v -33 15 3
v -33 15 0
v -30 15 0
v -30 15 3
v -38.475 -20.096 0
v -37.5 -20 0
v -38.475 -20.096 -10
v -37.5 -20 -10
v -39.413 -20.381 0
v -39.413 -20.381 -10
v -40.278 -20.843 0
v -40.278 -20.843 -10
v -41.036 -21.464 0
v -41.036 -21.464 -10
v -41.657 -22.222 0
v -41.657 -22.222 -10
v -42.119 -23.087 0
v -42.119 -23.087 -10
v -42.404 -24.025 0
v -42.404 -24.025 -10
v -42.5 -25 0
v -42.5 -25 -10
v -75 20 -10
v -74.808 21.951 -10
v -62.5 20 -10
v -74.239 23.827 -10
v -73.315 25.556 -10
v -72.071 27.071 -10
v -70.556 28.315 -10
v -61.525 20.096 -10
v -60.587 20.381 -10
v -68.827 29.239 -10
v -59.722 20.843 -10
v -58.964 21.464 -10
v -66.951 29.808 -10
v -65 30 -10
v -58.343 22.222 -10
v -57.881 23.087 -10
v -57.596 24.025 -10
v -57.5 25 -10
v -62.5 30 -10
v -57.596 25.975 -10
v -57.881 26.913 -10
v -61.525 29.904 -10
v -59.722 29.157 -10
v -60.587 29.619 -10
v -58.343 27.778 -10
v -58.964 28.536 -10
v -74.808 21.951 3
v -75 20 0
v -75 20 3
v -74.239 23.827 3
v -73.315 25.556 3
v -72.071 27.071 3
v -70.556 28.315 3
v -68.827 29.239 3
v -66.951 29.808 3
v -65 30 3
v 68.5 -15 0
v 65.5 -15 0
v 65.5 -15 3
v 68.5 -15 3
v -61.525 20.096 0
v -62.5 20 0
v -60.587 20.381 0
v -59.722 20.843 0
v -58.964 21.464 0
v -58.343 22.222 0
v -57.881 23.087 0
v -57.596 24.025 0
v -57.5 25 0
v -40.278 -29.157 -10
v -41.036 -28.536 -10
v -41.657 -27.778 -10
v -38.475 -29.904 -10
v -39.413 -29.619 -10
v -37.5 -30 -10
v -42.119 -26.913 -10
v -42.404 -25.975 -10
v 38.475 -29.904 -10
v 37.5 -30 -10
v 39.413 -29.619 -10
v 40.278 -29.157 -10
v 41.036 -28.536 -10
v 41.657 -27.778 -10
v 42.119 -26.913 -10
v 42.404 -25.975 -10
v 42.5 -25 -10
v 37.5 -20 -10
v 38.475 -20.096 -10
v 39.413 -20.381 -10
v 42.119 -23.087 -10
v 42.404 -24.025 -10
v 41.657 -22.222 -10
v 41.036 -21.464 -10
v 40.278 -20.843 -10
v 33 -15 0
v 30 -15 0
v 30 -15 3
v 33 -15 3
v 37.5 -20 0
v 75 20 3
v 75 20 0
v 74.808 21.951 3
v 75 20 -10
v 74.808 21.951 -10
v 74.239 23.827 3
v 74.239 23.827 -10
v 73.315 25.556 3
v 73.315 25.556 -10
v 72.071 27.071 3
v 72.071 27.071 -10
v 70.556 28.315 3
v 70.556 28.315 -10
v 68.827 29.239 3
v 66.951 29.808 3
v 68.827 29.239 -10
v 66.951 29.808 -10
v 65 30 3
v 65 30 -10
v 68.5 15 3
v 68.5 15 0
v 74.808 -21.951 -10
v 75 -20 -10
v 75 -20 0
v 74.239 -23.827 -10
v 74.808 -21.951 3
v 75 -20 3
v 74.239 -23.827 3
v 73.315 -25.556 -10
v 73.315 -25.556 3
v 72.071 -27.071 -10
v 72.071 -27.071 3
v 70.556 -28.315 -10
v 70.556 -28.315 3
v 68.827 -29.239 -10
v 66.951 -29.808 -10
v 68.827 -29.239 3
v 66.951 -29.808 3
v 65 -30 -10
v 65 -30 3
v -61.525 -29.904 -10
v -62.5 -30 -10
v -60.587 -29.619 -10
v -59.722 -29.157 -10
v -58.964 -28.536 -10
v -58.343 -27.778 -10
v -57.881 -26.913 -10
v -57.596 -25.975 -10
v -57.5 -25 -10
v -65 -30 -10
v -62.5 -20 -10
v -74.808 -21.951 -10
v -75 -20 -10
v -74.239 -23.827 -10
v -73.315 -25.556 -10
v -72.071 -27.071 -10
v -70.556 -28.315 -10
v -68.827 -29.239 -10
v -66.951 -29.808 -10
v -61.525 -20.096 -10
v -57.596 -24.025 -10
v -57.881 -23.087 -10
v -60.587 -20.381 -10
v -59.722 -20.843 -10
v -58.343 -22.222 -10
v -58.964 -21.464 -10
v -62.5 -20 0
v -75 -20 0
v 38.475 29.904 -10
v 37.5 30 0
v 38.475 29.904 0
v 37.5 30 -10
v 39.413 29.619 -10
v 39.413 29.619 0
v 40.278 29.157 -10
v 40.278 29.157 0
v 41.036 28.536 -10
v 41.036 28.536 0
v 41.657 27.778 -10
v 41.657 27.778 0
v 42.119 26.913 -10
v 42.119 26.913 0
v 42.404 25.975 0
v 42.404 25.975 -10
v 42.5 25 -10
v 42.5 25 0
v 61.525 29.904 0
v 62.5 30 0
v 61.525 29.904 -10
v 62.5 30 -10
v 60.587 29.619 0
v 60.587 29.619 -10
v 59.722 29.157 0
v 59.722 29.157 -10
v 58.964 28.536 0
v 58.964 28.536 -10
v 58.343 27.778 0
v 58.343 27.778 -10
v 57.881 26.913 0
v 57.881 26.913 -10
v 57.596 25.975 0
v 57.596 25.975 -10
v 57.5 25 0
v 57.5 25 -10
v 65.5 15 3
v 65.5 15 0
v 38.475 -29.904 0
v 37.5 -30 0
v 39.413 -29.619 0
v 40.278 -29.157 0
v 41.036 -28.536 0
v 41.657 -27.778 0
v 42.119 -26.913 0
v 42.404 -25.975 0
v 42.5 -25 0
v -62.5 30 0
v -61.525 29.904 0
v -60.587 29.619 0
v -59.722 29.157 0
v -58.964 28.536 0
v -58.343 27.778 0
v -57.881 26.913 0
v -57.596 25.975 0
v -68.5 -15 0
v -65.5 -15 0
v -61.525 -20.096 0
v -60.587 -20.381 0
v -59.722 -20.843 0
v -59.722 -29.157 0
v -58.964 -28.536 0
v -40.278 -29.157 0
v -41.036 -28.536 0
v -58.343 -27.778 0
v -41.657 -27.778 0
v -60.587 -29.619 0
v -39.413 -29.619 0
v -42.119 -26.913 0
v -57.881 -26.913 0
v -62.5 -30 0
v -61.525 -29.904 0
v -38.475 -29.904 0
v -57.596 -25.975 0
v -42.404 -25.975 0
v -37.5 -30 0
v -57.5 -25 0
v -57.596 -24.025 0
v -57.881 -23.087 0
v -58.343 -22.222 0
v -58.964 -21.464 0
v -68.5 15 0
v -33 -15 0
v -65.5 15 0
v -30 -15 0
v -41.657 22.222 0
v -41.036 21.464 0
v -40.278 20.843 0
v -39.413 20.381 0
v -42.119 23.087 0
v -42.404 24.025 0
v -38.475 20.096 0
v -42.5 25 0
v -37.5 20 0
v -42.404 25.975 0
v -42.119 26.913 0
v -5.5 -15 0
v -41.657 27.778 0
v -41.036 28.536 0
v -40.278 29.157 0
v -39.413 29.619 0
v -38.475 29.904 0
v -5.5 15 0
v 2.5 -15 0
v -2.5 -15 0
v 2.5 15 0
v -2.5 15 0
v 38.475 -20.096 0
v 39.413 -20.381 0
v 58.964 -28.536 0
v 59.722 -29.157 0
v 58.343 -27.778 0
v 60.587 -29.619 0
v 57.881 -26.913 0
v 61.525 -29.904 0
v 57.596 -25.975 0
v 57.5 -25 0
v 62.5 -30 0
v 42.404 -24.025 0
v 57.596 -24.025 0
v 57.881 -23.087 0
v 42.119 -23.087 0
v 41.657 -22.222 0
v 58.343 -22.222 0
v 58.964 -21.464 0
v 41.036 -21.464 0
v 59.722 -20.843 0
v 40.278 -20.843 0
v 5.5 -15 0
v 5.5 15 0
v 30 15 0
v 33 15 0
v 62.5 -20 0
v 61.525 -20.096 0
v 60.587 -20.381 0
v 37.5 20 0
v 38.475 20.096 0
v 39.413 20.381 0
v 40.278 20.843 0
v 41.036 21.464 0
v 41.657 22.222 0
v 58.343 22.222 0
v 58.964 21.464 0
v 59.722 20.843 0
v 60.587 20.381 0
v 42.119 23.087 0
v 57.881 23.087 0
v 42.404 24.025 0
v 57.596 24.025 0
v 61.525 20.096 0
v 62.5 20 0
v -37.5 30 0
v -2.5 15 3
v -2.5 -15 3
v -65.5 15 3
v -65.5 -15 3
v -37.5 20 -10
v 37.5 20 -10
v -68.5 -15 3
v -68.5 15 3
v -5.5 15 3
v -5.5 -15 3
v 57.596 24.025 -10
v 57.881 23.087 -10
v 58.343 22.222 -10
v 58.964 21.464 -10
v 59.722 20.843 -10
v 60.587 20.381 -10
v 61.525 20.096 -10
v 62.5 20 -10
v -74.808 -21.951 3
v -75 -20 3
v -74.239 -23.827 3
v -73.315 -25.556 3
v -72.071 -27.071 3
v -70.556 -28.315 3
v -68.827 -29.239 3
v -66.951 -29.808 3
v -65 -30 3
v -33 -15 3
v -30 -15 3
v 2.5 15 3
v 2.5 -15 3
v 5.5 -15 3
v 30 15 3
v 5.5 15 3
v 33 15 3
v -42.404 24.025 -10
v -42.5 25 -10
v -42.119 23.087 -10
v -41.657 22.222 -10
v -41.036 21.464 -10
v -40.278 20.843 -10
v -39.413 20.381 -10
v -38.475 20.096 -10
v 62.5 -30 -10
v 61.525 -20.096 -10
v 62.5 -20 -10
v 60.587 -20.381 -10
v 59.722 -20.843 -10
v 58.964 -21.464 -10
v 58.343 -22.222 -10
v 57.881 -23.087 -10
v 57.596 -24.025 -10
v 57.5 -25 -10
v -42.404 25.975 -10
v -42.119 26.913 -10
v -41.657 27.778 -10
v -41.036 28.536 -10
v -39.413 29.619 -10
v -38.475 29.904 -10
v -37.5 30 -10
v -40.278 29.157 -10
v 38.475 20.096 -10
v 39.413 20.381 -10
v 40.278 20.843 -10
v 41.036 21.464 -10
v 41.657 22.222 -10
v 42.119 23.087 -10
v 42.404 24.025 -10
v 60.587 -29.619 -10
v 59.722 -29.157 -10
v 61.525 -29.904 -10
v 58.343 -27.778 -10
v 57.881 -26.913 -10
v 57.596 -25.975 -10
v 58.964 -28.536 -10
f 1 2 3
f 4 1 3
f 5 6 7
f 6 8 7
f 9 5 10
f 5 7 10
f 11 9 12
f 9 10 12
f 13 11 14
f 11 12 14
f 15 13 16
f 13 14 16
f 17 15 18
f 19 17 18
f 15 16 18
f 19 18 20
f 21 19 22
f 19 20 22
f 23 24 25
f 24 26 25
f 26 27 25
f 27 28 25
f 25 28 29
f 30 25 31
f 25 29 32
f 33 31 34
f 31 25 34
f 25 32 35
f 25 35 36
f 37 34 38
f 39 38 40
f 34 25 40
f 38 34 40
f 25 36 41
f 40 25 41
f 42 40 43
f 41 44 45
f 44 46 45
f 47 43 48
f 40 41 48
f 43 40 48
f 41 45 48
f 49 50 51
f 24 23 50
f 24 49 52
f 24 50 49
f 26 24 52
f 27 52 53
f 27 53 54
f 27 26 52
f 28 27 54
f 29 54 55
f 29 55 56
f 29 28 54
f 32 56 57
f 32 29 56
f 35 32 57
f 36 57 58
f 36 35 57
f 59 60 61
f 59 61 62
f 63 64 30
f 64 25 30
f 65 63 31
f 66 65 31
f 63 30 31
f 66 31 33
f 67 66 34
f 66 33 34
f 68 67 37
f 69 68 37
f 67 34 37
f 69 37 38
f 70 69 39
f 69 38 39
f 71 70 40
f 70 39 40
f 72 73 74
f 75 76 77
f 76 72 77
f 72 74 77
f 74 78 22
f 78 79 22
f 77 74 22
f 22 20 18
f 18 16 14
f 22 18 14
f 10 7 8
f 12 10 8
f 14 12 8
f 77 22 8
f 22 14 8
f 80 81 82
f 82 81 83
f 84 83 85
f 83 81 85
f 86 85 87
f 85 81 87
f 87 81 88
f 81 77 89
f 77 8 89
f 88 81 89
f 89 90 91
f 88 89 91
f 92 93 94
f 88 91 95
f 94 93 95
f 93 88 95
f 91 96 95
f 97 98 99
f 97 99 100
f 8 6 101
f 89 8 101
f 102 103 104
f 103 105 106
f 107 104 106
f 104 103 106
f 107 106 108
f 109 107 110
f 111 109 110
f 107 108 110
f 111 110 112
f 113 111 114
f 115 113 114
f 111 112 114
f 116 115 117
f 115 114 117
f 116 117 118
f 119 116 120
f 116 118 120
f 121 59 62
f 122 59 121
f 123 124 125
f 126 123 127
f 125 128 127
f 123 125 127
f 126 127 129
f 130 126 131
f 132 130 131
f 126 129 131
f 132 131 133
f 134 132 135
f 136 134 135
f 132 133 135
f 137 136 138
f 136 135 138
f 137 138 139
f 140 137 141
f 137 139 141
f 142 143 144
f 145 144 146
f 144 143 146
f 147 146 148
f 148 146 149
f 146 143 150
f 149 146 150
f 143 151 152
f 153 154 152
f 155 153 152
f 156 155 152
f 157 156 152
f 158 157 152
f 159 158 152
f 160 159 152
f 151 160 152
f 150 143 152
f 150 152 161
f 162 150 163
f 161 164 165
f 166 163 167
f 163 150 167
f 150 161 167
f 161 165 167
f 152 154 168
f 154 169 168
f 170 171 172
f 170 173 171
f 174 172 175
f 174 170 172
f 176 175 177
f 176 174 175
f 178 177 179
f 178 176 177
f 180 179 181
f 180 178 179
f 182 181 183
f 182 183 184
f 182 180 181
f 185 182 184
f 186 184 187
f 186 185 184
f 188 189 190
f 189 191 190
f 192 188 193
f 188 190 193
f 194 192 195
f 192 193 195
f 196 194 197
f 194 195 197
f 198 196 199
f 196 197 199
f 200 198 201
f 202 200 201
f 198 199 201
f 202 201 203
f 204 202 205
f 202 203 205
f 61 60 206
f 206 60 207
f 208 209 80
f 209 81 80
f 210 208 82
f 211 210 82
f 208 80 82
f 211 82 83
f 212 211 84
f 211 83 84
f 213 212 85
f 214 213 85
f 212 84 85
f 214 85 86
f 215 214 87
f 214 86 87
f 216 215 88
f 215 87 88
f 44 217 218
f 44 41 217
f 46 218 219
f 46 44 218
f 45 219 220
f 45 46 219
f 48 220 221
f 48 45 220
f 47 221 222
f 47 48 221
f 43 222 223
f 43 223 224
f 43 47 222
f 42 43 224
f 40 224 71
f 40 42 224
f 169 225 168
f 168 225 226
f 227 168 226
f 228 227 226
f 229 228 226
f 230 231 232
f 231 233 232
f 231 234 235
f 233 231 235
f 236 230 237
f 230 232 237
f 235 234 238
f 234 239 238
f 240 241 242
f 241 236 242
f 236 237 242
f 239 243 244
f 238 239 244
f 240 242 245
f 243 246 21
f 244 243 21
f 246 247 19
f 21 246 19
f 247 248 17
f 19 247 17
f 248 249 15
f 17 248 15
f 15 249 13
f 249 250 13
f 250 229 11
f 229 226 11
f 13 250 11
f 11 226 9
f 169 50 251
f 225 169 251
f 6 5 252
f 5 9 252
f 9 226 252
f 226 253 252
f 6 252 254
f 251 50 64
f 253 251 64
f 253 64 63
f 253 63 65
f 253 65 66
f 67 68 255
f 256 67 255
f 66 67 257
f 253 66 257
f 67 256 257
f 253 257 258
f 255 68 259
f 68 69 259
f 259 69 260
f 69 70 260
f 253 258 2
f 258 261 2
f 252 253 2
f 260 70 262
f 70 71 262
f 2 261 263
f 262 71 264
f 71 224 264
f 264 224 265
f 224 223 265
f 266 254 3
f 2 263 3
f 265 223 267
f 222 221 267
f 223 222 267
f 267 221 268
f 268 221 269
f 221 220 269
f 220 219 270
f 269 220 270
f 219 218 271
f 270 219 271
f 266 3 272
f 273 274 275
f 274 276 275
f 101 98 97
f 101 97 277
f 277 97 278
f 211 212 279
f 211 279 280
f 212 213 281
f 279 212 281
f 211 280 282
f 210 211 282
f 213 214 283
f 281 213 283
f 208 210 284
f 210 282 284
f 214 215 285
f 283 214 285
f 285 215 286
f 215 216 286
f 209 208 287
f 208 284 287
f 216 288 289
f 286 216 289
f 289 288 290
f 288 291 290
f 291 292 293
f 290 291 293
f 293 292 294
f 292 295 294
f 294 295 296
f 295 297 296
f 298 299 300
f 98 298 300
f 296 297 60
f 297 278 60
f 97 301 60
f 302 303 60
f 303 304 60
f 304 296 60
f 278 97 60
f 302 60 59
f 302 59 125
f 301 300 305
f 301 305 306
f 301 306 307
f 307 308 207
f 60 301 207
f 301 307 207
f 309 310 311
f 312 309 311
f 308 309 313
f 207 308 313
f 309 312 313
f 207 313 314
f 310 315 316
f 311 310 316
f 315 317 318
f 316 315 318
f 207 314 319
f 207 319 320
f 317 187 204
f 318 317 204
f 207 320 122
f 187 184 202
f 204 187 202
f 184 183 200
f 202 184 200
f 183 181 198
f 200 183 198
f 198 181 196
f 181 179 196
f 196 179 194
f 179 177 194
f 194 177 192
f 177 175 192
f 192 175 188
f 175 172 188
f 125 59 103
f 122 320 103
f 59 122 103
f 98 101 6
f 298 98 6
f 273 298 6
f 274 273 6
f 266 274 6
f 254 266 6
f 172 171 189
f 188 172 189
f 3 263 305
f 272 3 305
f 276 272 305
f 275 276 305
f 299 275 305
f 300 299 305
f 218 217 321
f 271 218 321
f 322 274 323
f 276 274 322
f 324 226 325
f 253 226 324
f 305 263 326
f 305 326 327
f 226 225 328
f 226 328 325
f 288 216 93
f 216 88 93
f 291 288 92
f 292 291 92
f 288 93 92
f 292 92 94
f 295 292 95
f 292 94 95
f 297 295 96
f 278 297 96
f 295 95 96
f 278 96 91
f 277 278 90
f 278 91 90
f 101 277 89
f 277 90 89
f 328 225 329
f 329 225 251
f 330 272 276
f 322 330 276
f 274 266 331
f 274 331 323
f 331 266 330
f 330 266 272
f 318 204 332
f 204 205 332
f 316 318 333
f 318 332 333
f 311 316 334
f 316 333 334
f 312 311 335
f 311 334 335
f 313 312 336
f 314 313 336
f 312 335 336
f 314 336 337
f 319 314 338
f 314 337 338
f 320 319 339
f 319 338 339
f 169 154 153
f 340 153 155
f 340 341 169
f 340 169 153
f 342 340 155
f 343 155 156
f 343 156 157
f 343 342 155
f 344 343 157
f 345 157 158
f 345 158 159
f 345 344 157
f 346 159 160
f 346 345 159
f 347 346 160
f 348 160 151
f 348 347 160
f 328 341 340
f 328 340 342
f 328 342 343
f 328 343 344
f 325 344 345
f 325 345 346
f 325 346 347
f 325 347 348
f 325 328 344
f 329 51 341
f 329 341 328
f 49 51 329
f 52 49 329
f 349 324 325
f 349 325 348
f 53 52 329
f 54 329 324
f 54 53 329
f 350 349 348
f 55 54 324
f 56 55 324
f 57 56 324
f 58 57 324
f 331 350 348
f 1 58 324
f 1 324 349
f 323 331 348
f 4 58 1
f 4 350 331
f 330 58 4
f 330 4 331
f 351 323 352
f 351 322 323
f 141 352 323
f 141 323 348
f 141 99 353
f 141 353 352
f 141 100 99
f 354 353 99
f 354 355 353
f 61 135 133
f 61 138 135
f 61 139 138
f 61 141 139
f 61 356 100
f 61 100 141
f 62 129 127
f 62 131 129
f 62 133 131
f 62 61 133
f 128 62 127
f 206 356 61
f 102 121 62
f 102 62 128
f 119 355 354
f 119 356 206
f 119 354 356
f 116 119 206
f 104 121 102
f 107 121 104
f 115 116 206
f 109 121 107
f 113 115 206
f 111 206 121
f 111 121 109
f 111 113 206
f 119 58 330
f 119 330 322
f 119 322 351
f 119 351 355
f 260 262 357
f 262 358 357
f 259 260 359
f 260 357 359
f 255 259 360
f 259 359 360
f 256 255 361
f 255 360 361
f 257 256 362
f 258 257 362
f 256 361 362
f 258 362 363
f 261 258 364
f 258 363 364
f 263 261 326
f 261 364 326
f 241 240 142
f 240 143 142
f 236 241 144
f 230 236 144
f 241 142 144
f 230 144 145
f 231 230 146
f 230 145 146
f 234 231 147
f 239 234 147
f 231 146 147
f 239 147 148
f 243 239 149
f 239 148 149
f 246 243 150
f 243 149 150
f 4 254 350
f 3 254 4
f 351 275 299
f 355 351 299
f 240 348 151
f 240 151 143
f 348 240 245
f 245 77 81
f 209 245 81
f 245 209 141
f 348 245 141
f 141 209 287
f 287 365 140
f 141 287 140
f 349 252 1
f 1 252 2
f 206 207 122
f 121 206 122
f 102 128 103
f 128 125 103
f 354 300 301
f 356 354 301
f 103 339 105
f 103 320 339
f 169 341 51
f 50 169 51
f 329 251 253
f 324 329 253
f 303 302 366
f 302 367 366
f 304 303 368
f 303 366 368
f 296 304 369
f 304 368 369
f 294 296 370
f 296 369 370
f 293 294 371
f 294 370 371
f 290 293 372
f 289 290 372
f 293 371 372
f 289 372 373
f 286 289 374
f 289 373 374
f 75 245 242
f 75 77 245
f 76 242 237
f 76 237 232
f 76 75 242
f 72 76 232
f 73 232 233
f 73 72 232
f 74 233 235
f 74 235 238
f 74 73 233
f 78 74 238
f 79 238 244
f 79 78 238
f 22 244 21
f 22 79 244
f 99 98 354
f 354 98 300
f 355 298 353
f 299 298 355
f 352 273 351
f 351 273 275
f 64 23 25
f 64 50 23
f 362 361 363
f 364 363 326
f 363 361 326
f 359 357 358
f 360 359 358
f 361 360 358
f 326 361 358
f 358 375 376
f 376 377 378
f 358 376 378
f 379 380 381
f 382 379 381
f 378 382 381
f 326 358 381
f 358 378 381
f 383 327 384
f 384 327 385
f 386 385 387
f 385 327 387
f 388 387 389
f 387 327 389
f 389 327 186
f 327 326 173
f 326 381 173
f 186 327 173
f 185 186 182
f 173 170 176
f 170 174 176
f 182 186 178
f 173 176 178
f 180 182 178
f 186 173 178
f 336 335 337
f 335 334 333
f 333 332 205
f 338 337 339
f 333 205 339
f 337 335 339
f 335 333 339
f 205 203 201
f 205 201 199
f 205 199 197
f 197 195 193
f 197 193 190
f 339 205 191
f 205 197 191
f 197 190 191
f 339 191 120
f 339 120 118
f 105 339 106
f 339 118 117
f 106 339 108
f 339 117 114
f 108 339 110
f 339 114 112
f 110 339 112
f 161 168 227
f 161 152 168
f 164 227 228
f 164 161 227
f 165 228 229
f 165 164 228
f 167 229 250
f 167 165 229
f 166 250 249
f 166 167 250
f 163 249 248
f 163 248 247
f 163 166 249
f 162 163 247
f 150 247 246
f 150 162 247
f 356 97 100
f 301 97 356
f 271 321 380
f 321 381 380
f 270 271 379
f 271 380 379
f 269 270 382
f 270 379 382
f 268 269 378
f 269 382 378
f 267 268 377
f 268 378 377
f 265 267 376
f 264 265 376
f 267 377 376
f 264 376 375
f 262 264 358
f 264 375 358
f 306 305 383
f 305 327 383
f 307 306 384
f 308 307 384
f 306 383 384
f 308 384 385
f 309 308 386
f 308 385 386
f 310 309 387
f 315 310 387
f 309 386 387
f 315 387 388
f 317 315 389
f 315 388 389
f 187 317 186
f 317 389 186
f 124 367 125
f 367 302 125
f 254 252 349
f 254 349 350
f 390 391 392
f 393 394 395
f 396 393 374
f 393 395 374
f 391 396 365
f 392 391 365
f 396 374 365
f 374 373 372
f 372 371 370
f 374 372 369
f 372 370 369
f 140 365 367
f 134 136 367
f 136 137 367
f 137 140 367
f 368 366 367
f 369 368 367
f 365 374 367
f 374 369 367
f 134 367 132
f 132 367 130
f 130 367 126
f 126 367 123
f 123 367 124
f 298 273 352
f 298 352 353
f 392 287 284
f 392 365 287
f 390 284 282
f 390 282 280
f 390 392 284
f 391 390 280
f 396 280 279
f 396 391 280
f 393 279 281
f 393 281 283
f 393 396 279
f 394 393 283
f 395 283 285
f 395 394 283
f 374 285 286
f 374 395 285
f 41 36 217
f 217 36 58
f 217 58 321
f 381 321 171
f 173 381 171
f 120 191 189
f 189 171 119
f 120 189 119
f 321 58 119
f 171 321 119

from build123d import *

# Parameters (mm, degrees)
F0_W     = 150
F0_H     = 60
F1_DEPTH = 3
F2_W     = 3
F2_H     = 30
F3_DEPTH = 25
F4_W     = 17.5
F4_H     = 10
F4_W_2   = 85
F5_DEPTH = 10
F6_R     = 10
F7_R     = 4.99999


# Not quite as in the source:
# - a fillet or chamfer is up to 0.001 mm smaller than in the source, because OpenCascade refuses the exact size


with BuildPart() as f1:
    # F0 (on Top) → F1 (new body)
    with BuildSketch(Plane.XY):
        Rectangle(F0_W, F0_H)
    extrude(amount=F1_DEPTH)

    # F2 (on Top) → F3 (cut)
    with BuildSketch(Plane.XY):
        with Locations((-67, 0)):
            Rectangle(F2_W, F2_H)
        with Locations((-31.5, 0)):
            Rectangle(F2_W, F2_H)
        with Locations((-4, 0)):
            Rectangle(F2_W, F2_H)
        with Locations((4, 0)):
            Rectangle(F2_W, F2_H)
        with Locations((31.5, 0)):
            Rectangle(F2_W, F2_H)
        with Locations((67, 0)):
            Rectangle(F2_W, F2_H)
    extrude(amount=F3_DEPTH, mode=Mode.SUBTRACT)

    # F4 (on Top) → F5 (join)
    with BuildSketch(Plane.XY):
        with Locations((-66.25, 25)):
            Rectangle(F4_W, F4_H)
        with Locations((66.25, 25)):
            Rectangle(F4_W, F4_H)
        with Locations((-66.25, -25)):
            Rectangle(F4_W, F4_H)
        with Locations((66.25, -25)):
            Rectangle(F4_W, F4_H)
        with Locations((0, 25)):
            Rectangle(F4_W_2, F4_H)
        with Locations((0, -25)):
            Rectangle(F4_W_2, F4_H)
    extrude(amount=-F5_DEPTH)

    # F6
    f6_edges = [f1.edges().sort_by_distance(p)[0] for p in [
        (-75, 30, -3.5),
        (-75, -30, -3.5),
        (75, -30, -3.5),
        (75, 30, -3.5),
    ]]
    fillet(f6_edges, radius=F6_R)

    # F7 (radius 5 in the source; OpenCascade refuses exactly that, so slightly less here)
    f7_edges = [f1.edges().sort_by_distance(p)[0] for p in [
        (57.5, 20, -5),
        (42.5, 20, -5),
        (57.5, -20, -5),
        (42.5, -20, -5),
        (42.5, -30, -5),
        (57.5, -30, -5),
        (57.5, 30, -5),
        (42.5, 30, -5),
        (-42.5, 20, -5),
        (-42.5, -30, -5),
        (-42.5, -20, -5),
        (-57.5, -20, -5),
        (-57.5, -30, -5),
        (-57.5, 20, -5),
        (-42.5, 30, -5),
        (-57.5, 30, -5),
    ]]
    fillet(f7_edges, radius=F7_R)


solid = f1.part
